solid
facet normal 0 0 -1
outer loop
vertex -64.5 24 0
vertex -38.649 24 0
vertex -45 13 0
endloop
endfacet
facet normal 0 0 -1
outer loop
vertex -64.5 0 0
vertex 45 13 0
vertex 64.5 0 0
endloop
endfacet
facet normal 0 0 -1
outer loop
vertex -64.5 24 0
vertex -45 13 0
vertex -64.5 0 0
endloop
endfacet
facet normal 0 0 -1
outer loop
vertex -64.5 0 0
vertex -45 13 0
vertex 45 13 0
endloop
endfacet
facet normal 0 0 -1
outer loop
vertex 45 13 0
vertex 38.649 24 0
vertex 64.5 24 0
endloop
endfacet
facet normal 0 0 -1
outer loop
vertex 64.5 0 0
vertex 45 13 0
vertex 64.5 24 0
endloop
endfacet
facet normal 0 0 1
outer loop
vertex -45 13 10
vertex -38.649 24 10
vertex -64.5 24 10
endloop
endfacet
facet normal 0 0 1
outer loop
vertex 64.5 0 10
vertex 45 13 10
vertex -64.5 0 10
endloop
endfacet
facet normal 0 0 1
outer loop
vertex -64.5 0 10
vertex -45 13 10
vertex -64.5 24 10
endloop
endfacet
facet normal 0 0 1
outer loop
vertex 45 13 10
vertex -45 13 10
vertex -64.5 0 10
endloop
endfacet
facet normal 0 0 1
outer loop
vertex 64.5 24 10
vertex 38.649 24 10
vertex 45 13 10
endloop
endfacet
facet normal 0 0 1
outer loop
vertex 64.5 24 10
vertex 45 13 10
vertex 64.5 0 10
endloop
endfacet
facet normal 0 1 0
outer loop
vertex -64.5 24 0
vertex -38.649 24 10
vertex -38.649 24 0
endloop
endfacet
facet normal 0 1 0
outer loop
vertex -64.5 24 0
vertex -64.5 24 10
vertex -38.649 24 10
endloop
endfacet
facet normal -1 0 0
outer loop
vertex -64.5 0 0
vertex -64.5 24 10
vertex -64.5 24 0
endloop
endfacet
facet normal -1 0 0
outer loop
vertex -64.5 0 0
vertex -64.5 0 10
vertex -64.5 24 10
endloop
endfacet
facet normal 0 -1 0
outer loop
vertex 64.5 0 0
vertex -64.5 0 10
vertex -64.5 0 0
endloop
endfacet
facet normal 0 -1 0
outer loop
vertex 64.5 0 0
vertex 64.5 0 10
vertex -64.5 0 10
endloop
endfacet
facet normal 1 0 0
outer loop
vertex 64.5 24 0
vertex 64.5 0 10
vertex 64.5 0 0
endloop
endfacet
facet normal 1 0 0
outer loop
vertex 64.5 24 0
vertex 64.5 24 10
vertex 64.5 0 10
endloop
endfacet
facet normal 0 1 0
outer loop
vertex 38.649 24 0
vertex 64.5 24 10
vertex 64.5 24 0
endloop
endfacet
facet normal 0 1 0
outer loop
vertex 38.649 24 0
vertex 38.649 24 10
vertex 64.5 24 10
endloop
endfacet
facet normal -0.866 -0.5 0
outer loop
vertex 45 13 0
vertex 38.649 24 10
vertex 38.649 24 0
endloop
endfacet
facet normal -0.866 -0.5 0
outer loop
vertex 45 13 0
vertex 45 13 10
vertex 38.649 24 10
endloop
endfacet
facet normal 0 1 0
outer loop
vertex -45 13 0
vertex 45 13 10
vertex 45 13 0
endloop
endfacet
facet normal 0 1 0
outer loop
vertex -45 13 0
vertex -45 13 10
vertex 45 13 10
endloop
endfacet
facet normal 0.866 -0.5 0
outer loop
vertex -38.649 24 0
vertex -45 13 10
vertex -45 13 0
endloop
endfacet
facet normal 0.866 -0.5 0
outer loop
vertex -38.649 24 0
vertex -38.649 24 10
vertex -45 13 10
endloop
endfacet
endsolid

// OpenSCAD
/*

 ______________              ______________
|            /               \            |
|           /_________________\           |
|_________________________________________|

*/


// angle = 45;
angle = 30;

w_small = 31;
w_big = 52;
w_length = 460;

wedge_depth = 11;

thickness = 13;

simple();

module simple(wedge_width=45, extrude=10){
  linear_extrude(extrude) 
  simple_2d(wedge_width);
}

module simple_2d(wedge_width=40){
  half_simple_2d(wedge_width);
  mirror([1,0,0]) 
  half_simple_2d(wedge_width);
}

module half_simple_2d(wedge_width=40){
  polygon(points = [
    [0,0],
    [0,thickness],
    [wedge_width,thickness],
    [wedge_width-tan(angle)*wedge_depth,thickness+wedge_depth],
    [wedge_width+1.5*thickness,thickness+wedge_depth],
    [wedge_width+1.5*thickness,0]
  ]);
}
